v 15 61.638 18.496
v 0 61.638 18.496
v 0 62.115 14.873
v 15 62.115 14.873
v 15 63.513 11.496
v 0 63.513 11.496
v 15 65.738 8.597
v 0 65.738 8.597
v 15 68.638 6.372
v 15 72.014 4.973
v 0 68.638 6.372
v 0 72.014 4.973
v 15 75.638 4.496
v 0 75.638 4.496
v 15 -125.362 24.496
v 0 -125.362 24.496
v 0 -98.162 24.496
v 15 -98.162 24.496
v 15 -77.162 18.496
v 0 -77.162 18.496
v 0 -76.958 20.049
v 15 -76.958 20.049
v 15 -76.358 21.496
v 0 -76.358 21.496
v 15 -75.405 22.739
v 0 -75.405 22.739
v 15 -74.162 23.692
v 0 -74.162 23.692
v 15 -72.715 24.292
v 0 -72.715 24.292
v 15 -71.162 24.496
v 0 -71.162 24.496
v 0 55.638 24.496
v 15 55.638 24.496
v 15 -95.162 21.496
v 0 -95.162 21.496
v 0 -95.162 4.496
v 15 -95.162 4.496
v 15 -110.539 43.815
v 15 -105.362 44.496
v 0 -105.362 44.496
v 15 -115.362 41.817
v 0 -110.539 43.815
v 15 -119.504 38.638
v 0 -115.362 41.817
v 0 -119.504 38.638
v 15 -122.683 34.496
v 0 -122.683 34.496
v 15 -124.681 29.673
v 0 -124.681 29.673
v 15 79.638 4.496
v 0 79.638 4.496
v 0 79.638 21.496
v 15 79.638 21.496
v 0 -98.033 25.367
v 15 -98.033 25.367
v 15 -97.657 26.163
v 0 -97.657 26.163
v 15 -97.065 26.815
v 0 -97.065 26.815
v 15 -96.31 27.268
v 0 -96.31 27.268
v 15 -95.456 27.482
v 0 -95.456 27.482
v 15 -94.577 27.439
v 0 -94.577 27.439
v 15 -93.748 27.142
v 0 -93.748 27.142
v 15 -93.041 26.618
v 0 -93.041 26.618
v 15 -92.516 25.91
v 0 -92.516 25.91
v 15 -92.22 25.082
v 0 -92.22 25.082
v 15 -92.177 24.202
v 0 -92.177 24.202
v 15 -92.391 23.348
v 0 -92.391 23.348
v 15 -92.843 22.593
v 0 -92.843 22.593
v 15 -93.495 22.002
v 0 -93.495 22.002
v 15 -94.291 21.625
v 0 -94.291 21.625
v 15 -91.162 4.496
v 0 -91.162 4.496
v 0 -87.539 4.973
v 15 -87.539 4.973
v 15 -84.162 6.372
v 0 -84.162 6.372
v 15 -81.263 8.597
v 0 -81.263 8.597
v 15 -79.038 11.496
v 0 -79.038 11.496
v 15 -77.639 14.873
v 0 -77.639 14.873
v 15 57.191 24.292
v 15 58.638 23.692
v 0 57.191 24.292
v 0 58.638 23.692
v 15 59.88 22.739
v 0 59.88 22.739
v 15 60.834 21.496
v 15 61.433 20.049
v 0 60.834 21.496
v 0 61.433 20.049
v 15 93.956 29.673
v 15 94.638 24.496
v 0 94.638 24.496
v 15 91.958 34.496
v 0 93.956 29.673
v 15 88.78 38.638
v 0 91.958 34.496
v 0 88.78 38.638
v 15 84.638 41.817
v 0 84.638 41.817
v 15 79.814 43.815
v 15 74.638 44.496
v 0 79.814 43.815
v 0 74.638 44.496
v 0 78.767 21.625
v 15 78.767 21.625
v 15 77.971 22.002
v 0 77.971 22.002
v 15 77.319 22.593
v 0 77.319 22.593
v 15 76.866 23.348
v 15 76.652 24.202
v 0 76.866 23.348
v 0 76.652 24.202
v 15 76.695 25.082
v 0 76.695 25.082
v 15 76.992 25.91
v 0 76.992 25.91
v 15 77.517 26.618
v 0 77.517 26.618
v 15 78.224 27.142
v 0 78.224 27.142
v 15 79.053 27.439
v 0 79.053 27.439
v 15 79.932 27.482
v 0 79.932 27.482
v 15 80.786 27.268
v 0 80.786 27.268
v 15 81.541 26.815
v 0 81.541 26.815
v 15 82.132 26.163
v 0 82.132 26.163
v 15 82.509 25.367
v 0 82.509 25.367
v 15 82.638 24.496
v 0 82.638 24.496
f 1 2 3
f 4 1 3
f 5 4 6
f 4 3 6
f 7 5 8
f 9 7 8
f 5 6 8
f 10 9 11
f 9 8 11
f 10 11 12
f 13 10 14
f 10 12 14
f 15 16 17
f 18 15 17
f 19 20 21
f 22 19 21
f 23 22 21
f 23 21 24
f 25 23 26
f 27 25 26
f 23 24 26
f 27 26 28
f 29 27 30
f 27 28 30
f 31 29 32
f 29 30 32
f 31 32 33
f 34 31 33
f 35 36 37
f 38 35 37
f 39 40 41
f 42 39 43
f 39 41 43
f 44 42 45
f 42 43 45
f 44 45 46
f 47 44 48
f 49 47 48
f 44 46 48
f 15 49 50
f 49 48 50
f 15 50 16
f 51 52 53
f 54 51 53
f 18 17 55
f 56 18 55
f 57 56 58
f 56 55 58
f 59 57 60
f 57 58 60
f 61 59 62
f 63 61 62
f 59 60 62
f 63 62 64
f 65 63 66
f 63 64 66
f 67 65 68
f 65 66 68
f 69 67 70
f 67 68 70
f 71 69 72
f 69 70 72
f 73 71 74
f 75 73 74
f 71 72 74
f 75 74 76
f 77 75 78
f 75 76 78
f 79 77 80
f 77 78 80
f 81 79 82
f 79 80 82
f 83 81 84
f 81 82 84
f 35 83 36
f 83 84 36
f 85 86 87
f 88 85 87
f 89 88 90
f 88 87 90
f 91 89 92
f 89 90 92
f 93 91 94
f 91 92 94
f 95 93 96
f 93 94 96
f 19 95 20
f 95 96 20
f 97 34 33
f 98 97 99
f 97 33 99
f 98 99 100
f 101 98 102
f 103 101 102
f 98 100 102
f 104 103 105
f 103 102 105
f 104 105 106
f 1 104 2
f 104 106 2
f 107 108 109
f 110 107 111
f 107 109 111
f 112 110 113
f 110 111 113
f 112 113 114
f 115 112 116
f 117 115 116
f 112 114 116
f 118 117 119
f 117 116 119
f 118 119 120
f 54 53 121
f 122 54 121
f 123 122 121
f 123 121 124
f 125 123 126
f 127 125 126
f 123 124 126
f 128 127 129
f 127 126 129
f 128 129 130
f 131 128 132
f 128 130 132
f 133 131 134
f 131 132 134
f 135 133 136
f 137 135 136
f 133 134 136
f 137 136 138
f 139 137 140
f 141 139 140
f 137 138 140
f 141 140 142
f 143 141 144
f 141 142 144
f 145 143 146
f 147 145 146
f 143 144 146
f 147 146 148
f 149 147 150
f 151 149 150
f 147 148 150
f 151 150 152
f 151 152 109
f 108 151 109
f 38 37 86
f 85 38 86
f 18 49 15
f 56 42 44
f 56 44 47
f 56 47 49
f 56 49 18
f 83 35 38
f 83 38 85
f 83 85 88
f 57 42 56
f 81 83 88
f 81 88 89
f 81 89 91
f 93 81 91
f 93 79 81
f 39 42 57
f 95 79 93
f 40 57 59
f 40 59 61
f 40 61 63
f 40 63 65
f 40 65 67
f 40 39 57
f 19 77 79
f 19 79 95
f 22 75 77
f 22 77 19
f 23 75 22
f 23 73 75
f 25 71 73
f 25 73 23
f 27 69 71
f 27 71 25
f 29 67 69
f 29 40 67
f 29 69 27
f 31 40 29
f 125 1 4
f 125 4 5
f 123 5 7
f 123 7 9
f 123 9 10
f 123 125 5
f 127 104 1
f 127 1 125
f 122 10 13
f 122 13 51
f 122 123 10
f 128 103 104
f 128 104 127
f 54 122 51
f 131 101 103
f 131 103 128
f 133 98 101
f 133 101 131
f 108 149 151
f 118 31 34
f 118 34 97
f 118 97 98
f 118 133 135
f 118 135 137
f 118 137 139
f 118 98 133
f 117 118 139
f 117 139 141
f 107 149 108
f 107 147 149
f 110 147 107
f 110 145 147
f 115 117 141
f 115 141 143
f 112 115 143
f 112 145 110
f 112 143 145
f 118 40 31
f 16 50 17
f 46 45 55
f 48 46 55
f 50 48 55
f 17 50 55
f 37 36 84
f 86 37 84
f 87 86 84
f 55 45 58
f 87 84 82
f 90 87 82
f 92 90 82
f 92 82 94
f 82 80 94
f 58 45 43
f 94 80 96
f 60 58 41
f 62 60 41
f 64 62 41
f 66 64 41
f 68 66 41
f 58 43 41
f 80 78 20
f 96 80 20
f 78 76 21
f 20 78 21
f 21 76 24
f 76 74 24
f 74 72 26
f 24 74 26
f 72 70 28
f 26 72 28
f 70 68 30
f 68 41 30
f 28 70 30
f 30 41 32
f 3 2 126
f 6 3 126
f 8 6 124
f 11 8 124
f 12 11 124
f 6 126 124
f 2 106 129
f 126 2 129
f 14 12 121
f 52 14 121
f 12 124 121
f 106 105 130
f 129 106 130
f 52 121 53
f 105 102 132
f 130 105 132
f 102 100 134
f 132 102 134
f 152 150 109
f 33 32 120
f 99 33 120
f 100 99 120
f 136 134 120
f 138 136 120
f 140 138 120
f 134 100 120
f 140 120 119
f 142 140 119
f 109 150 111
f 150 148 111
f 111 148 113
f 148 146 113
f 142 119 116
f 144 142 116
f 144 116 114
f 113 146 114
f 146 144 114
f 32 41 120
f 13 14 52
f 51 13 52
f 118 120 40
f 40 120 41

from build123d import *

# Parameters (mm, degrees)
F1_DEPTH = 15


# Not quite as in the source:
# - a feature names something its author has since deleted; it is built from what else it names


with BuildPart() as f1:
    # F0 (on Right) → F1 (new body)
    with BuildSketch(Plane.YZ):
        with BuildLine():
            Line((-15.3621651637, 44.4962902069), (-105.3621651637, 44.4962902069))
            ThreePointArc((-105.3621651637, 44.4962902069), (-119.5043007874, 38.6384258306), (-125.3621651637, 24.4962902069))
            Line((-125.3621651637, 24.4962902069), (-98.1621651637, 24.4962902069))
            ThreePointArc((-98.1621651637, 24.4962902069), (-93.0408448201, 26.6176105505), (-95.1621651637, 21.4962902069))
            Line((-95.1621651637, 21.4962902069), (-95.1621651637, 4.4962902069))
            Line((-95.1621651637, 4.4962902069), (-91.1621651637, 4.4962902069))
            ThreePointArc((-91.1621651637, 4.4962902069), (-81.2626702271, 8.5967952703), (-77.1621651637, 18.4962902069))
            ThreePointArc((-77.1621651637, 18.4962902069), (-75.4048058508, 22.738930894), (-71.1621651637, 24.4962902069))
            Line((-71.1621651637, 24.4962902069), (-15.3621651637, 24.4962902069))
            Line((-15.3621651637, 24.4962902069), (40.4378348363, 24.4962902069))
            Line((40.4378348363, 24.4962902069), (55.6378348363, 24.4962902069))
            ThreePointArc((55.6378348363, 24.4962902069), (59.8804755234, 22.738930894), (61.6378348363, 18.4962902069))
            ThreePointArc((61.6378348363, 18.4962902069), (65.7383398997, 8.5967952703), (75.6378348363, 4.4962902069))
            Line((75.6378348363, 4.4962902069), (79.6378348363, 4.4962902069))
            Line((79.6378348363, 4.4962902069), (79.6378348363, 21.4962902069))
            ThreePointArc((79.6378348363, 21.4962902069), (77.5165144927, 26.6176105505), (82.6378348363, 24.4962902069))
            Line((82.6378348363, 24.4962902069), (94.6378348363, 24.4962902069))
            ThreePointArc((94.6378348363, 24.4962902069), (88.77997046, 38.6384258306), (74.6378348363, 44.4962902069))
            Line((74.6378348363, 44.4962902069), (-15.3621651637, 44.4962902069))
        make_face()
    extrude(amount=F1_DEPTH)


solid = f1.part
